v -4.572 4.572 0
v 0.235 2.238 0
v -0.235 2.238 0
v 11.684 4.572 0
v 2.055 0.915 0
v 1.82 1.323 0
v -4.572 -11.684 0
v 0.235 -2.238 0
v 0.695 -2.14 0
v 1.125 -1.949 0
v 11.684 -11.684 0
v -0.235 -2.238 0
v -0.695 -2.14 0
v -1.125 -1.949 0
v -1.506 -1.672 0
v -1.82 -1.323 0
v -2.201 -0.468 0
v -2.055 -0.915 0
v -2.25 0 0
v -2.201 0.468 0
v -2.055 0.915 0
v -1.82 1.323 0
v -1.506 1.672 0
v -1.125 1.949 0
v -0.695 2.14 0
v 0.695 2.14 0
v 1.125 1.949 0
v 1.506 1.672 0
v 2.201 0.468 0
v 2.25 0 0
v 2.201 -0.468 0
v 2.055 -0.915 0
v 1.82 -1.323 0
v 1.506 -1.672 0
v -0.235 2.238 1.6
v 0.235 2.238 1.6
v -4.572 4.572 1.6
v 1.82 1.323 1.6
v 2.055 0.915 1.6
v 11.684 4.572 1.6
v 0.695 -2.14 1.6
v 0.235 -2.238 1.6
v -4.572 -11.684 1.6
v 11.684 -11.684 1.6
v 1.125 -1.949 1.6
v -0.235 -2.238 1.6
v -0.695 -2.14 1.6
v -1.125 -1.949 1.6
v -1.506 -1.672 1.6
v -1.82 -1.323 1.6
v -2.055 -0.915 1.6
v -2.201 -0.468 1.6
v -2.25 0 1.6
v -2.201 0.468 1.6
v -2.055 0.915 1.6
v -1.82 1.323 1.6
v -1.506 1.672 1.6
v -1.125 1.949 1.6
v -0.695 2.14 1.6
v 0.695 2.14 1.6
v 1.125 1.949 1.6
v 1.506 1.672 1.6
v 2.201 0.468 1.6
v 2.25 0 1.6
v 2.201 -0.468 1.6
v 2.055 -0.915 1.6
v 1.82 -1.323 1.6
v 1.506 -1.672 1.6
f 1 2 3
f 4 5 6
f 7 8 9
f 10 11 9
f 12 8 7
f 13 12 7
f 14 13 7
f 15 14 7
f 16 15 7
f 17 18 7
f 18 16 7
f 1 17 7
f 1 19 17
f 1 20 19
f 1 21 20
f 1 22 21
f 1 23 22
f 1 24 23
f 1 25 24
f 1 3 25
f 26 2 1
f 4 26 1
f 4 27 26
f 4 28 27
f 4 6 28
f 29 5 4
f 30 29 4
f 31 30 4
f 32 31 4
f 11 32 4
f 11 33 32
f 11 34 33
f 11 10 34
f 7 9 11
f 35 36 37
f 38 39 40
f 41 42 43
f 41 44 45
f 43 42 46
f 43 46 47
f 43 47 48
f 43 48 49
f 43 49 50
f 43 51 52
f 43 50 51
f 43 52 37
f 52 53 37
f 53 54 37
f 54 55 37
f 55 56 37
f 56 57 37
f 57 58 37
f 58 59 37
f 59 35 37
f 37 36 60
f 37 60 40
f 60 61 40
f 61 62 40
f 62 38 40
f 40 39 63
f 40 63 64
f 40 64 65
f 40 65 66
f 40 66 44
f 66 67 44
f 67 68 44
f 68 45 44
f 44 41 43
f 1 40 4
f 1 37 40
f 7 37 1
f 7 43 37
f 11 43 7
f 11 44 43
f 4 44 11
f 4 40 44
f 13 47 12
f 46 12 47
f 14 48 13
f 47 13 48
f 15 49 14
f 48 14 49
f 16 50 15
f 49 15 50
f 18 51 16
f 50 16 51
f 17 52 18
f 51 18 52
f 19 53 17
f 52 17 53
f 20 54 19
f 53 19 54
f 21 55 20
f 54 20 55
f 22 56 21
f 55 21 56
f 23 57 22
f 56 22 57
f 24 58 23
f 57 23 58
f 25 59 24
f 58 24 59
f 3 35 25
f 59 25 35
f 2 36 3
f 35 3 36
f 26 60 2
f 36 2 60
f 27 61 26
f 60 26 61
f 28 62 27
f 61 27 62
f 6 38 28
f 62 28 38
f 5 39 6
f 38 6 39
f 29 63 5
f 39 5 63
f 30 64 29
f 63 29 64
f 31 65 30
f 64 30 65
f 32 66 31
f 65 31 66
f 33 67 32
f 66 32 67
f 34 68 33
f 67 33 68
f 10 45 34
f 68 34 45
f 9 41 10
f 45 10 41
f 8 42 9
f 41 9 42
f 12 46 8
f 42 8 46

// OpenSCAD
// file: 801f8c8ad5252d830007bc8fb8f76d3168990c0b1102200be74383be07b724a8.scad
/*
   Copyright 2018 Scott Bezek and the splitflap contributors

   Licensed under the Apache License, Version 2.0 (the "License");
   you may not use this file except in compliance with the License.
   You may obtain a copy of the License at

       http://www.apache.org/licenses/LICENSE-2.0

   Unless required by applicable law or agreed to in writing, software
   distributed under the License is distributed on an "AS IS" BASIS,
   WITHOUT WARRANTIES OR CONDITIONS OF ANY KIND, either express or implied.
   See the License for the specific language governing permissions and
   limitations under the License.
*/

include <3a8aa1ee2c5f15af7c9a4d3d95d6786cd3b11c8e1af2661494beaac4b8dd79fa.scad>;

pcb_thickness = 1.6;
sensor_spool_distance = 0.70;  // distance from the sensor to the face of the spool

// From datasheet:
hall_effect_height = (2.8 + 3.2) / 2;
hall_effect_width = (3.9 + 4.3) / 2;
hall_effect_thickness = (1.40 + 1.60) / 2;
hall_effect_sensor_offset_y = hall_effect_height - 1.25;
hall_effect_pin_length_max = 14.5;

// From sensor.kicad_pcb:
pcb_height = 16.256;
pcb_length = 16.256;
pcb_hole_to_sensor_pin_1_x = 10.16;
pcb_hole_to_sensor_pin_1_y = 1.27;
sensor_pin_pitch = 2.54;
pcb_hole_to_connector_pin_1_x = 8.636;
pcb_hole_to_connector_pin_1_y = 8.636;
connector_pin_pitch = 2.54;
pcb_edge_to_hole_x = 4.572;
pcb_edge_to_hole_y = 4.572;

pcb_adjustment_range = 4;
pcb_hole_radius = m4_hole_diameter/2;

// Jig dimensions
pcb_jig_corner_fillet = 2;
pcb_jig_align_thickness = 2;
pcb_jig_align_length = 0;  // past the PCB thickness
pcb_jig_align_clearance = 0.25;  // on x, around the PCB
pcb_jig_depth_clearance = 0.1;  // on y, from sensor to jig


// Computed dimensions
pcb_hole_to_sensor_x = pcb_hole_to_sensor_pin_1_x - sensor_pin_pitch;
pcb_hole_to_sensor_y = pcb_hole_to_sensor_pin_1_y + hall_effect_sensor_offset_y;


// Rough numbers for 3d rendering only (non-critical dimensions)
pcb_connector_height = 3.2;
pcb_connector_width = 8.2;
pcb_connector_length = 18;
pcb_connector_pin_width = 0.64;
pcb_connector_pin_slop = 0.4;
pcb_connector_pin_tail_length = 3.05 + 2.5/2;

pcb_sensor_pin_width = 0.43;

        module color_selector(c) {
            precision = 0.0000001;  // arbitrary
            function compare_floats(x, y, i=0) = 
                  (len(x) != len(y)) ? false  // if arrays differ in length, they can't be equal
                : (i >= len(x)) ? true  // if we've hit the end of the arrays without issue, we're equal
                : (x[i] - precision <= y[i]) && x[i] + precision >= y[i]
                    ? compare_floats(x, y, i+1)
                    : false;  // not equal, short circuit

            if (c == [0, 0.5, 0] || compare_floats(c, [0, 0.5, 0]))
                children();
        }
                    
// file: 3a8aa1ee2c5f15af7c9a4d3d95d6786cd3b11c8e1af2661494beaac4b8dd79fa.scad
/*
   Copyright 2015-2018 Scott Bezek and the splitflap contributors

   Licensed under the Apache License, Version 2.0 (the "License");
   you may not use this file except in compliance with the License.
   You may obtain a copy of the License at

       http://www.apache.org/licenses/LICENSE-2.0

   Unless required by applicable law or agreed to in writing, software
   distributed under the License is distributed on an "AS IS" BASIS,
   WITHOUT WARRANTIES OR CONDITIONS OF ANY KIND, either express or implied.
   See the License for the specific language governing permissions and
   limitations under the License.
*/

// M4 bolts
m4_hole_diameter = 4.5;
m4_bolt_length = 10;
m4_button_head_diameter = 7.6 + .2;
m4_button_head_length = 2.2 + .2;
m4_nut_width_flats = 7 + .2;
m4_nut_width_corners = 7/cos(180/6);
m4_nut_width_corners_padded = m4_nut_width_corners + .2;
m4_nut_length = 3.2;
m4_nut_length_padded = m4_nut_length + .2;


        module color_selector(c) {
            precision = 0.0000001;  // arbitrary
            function compare_floats(x, y, i=0) = 
                  (len(x) != len(y)) ? false  // if arrays differ in length, they can't be equal
                : (i >= len(x)) ? true  // if we've hit the end of the arrays without issue, we're equal
                : (x[i] - precision <= y[i]) && x[i] + precision >= y[i]
                    ? compare_floats(x, y, i+1)
                    : false;  // not equal, short circuit

            if (c == [0, 0.5, 0] || compare_floats(c, [0, 0.5, 0]))
                children();
        }
                    
// main file
/*
   Copyright 2015-2018 Scott Bezek and the splitflap contributors

   Licensed under the Apache License, Version 2.0 (the "License");
   you may not use this file except in compliance with the License.
   You may obtain a copy of the License at

       http://www.apache.org/licenses/LICENSE-2.0

   Unless required by applicable law or agreed to in writing, software
   distributed under the License is distributed on an "AS IS" BASIS,
   WITHOUT WARRANTIES OR CONDITIONS OF ANY KIND, either express or implied.
   See the License for the specific language governing permissions and
   limitations under the License.
*/
include <3a8aa1ee2c5f15af7c9a4d3d95d6786cd3b11c8e1af2661494beaac4b8dd79fa.scad>;
include <801f8c8ad5252d830007bc8fb8f76d3168990c0b1102200be74383be07b724a8.scad>;


module pcb_outline_2d(hole=true) {
    difference() {
        translate([-pcb_edge_to_hole_x, -pcb_height + pcb_edge_to_hole_y]) {
            square([pcb_length, pcb_height]);
        }
        if(hole) {
            circle(r=m4_hole_diameter/2, $fn=30);
        }
    }
}

// 3D PCB module, origin at the center of the mounting hole on the bottom surface of the PCB
module pcb(pcb_to_spool, render_jig=false, jig_thickness=0) {
     color_selector([0, 0.5, 0]) {
        linear_extrude(height=pcb_thickness) {
            pcb_outline_2d();
        }
    }

    // Connector
     color_selector([0, 0, 0]) {
        translate([pcb_hole_to_connector_pin_1_x - connector_pin_pitch - pcb_connector_width/2, -pcb_hole_to_connector_pin_1_y - pcb_connector_length, pcb_thickness]) {
            cube([pcb_connector_width, pcb_connector_length, pcb_connector_height]);
        }
    }

    // Connector pins
     color_selector([0.5, 0.5, 0.5]) {
        translate([pcb_hole_to_connector_pin_1_x - pcb_connector_pin_width/2, -pcb_hole_to_connector_pin_1_y - pcb_connector_pin_width/2, -pcb_connector_pin_tail_length + pcb_thickness + 2.5/2]) {
            cube([pcb_connector_pin_width, pcb_connector_pin_width, pcb_connector_pin_tail_length]);
            translate([-connector_pin_pitch, 0, 0]) {
                cube([pcb_connector_pin_width, pcb_connector_pin_width, pcb_connector_pin_tail_length]);
            }
            translate([-connector_pin_pitch * 2, 0, 0]) {
                cube([pcb_connector_pin_width, pcb_connector_pin_width, pcb_connector_pin_tail_length]);
            }
        }
    }

    // Sensor pins
     color_selector([0.5, 0.5, 0.5]) {
        pin_extra_length = 0.1;  // pins excess sticking out from the back of the PCB
        sensor_z_offset = pcb_to_spool - sensor_spool_distance - hall_effect_thickness/2 - 0.1;
        sensor_pin_length = sensor_z_offset + pcb_thickness + pin_extra_length;
        assert(sensor_pin_length < hall_effect_pin_length_max, "Warning: design is too thick to fit sensor");

        translate([pcb_hole_to_sensor_pin_1_x - pcb_sensor_pin_width/2, pcb_hole_to_sensor_pin_1_y - pcb_sensor_pin_width/2, -sensor_z_offset]) {
            cube([pcb_sensor_pin_width, pcb_sensor_pin_width, sensor_pin_length]);
            translate([-sensor_pin_pitch, 0, 0]) {
                cube([pcb_sensor_pin_width, pcb_sensor_pin_width, sensor_pin_length]);
            }
            translate([-sensor_pin_pitch * 2, 0, 0]) {
                cube([pcb_sensor_pin_width, pcb_sensor_pin_width, sensor_pin_length]);
            }
        }
    }

    // Sensor body
     color_selector([0, 0, 0]) {
        translate([pcb_hole_to_sensor_pin_1_x - sensor_pin_pitch - hall_effect_width/2, pcb_hole_to_sensor_pin_1_y, -pcb_to_spool + sensor_spool_distance]) {
            cube([hall_effect_width, hall_effect_height, hall_effect_thickness]);
        }
    }

    // Jig
    if(render_jig) {
         color_selector([1, 1, 0])
        translate([-pcb_edge_to_hole_x - pcb_jig_align_thickness - pcb_jig_align_clearance, pcb_hole_to_sensor_pin_1_y + pcb_sensor_pin_width/2 + thickness, -pcb_to_sensor(pcb_to_spool) + pcb_jig_depth_clearance])
        rotate([90, 0, 0])
            sensor_jig(pcb_to_spool, jig_thickness);
    }
}

// 2D cutouts needed to mount the PCB module, origin at the center of the mounting hole
module pcb_cutouts(adjustment_range=pcb_adjustment_range) {
    hull_slide(delta=adjustment_range) {
        // Bolt slot
        hull() {
            circle(r=m4_hole_diameter/2, $fn=30);
            translate([pcb_hole_to_sensor_pin_1_x + sensor_pin_pitch - m4_hole_diameter/2, 0, 0])
                circle(r=m4_hole_diameter/2, $fn=30);
        }
        // Pin header slot
        translate([pcb_hole_to_connector_pin_1_x - connector_pin_pitch, -pcb_hole_to_connector_pin_1_y]) {
            hull() {
                pin_slot_height = pcb_connector_pin_width + pcb_connector_pin_slop;
                pin_slot_width = connector_pin_pitch * 4 - pin_slot_height;
                translate([pin_slot_width/2, 0, 0])
                    circle(pin_slot_height/2, $fn=15);
                translate([-pin_slot_width/2, 0, 0])
                    circle(pin_slot_height/2, $fn=15);
            }
        }
    }
}

module hull_slide(delta) {
    for (i = [0:$children - 1]) {
        hull() {
            translate([-delta, 0]) {
                children(i);
            }
            translate([delta, 0]) {
                children(i);
            }
        }
    }
}

function pcb_to_sensor(pcb_to_spool) = pcb_to_spool - sensor_spool_distance - hall_effect_thickness;  // using sensor rear face
function pcb_hole_to_sensor_x() = pcb_hole_to_sensor_x;
function pcb_hole_to_sensor_y() = pcb_hole_to_sensor_y;
function pcb_thickness() = pcb_thickness;
function sensor_jig_height(pcb_to_spool) = pcb_to_sensor(pcb_to_spool) - pcb_jig_depth_clearance + pcb_jig_align_length + pcb_thickness;
function sensor_jig_width(pcb_to_spool) = pcb_length + (pcb_jig_align_thickness + pcb_jig_align_clearance) * 2;

module sensor_jig(pcb_to_spool, thickness) {
    module fillet() {
        eps = 0.01;
        difference() {
            translate([-eps, -eps, 0])
                square(pcb_jig_corner_fillet + eps);
            translate([pcb_jig_corner_fillet, pcb_jig_corner_fillet, 0])
                circle(r=pcb_jig_corner_fillet, $fn=20);
        }
    }

    linear_extrude(thickness) {
        difference() {
        union() {
            square([sensor_jig_width(pcb_to_spool), pcb_to_sensor(pcb_to_spool) - pcb_jig_depth_clearance]);  // main body
            square([pcb_jig_align_thickness, sensor_jig_height(pcb_to_spool)]);  // alignment edge, left
            translate([sensor_jig_width(pcb_to_spool) - pcb_jig_align_thickness, 0])
            square([pcb_jig_align_thickness, sensor_jig_height(pcb_to_spool)]);  // alignment edge, right
        }
        fillet();
        mirror([1, 0, 0])
            translate([-sensor_jig_width(pcb_to_spool), 0, 0])
                fillet();
        }
    }
}

// Example usage:
pcb(10);

        module color_selector(c) {
            precision = 0.0000001;  // arbitrary
            function compare_floats(x, y, i=0) = 
                  (len(x) != len(y)) ? false  // if arrays differ in length, they can't be equal
                : (i >= len(x)) ? true  // if we've hit the end of the arrays without issue, we're equal
                : (x[i] - precision <= y[i]) && x[i] + precision >= y[i]
                    ? compare_floats(x, y, i+1)
                    : false;  // not equal, short circuit

            if (c == [0, 0.5, 0] || compare_floats(c, [0, 0.5, 0]))
                children();
        }
                    
